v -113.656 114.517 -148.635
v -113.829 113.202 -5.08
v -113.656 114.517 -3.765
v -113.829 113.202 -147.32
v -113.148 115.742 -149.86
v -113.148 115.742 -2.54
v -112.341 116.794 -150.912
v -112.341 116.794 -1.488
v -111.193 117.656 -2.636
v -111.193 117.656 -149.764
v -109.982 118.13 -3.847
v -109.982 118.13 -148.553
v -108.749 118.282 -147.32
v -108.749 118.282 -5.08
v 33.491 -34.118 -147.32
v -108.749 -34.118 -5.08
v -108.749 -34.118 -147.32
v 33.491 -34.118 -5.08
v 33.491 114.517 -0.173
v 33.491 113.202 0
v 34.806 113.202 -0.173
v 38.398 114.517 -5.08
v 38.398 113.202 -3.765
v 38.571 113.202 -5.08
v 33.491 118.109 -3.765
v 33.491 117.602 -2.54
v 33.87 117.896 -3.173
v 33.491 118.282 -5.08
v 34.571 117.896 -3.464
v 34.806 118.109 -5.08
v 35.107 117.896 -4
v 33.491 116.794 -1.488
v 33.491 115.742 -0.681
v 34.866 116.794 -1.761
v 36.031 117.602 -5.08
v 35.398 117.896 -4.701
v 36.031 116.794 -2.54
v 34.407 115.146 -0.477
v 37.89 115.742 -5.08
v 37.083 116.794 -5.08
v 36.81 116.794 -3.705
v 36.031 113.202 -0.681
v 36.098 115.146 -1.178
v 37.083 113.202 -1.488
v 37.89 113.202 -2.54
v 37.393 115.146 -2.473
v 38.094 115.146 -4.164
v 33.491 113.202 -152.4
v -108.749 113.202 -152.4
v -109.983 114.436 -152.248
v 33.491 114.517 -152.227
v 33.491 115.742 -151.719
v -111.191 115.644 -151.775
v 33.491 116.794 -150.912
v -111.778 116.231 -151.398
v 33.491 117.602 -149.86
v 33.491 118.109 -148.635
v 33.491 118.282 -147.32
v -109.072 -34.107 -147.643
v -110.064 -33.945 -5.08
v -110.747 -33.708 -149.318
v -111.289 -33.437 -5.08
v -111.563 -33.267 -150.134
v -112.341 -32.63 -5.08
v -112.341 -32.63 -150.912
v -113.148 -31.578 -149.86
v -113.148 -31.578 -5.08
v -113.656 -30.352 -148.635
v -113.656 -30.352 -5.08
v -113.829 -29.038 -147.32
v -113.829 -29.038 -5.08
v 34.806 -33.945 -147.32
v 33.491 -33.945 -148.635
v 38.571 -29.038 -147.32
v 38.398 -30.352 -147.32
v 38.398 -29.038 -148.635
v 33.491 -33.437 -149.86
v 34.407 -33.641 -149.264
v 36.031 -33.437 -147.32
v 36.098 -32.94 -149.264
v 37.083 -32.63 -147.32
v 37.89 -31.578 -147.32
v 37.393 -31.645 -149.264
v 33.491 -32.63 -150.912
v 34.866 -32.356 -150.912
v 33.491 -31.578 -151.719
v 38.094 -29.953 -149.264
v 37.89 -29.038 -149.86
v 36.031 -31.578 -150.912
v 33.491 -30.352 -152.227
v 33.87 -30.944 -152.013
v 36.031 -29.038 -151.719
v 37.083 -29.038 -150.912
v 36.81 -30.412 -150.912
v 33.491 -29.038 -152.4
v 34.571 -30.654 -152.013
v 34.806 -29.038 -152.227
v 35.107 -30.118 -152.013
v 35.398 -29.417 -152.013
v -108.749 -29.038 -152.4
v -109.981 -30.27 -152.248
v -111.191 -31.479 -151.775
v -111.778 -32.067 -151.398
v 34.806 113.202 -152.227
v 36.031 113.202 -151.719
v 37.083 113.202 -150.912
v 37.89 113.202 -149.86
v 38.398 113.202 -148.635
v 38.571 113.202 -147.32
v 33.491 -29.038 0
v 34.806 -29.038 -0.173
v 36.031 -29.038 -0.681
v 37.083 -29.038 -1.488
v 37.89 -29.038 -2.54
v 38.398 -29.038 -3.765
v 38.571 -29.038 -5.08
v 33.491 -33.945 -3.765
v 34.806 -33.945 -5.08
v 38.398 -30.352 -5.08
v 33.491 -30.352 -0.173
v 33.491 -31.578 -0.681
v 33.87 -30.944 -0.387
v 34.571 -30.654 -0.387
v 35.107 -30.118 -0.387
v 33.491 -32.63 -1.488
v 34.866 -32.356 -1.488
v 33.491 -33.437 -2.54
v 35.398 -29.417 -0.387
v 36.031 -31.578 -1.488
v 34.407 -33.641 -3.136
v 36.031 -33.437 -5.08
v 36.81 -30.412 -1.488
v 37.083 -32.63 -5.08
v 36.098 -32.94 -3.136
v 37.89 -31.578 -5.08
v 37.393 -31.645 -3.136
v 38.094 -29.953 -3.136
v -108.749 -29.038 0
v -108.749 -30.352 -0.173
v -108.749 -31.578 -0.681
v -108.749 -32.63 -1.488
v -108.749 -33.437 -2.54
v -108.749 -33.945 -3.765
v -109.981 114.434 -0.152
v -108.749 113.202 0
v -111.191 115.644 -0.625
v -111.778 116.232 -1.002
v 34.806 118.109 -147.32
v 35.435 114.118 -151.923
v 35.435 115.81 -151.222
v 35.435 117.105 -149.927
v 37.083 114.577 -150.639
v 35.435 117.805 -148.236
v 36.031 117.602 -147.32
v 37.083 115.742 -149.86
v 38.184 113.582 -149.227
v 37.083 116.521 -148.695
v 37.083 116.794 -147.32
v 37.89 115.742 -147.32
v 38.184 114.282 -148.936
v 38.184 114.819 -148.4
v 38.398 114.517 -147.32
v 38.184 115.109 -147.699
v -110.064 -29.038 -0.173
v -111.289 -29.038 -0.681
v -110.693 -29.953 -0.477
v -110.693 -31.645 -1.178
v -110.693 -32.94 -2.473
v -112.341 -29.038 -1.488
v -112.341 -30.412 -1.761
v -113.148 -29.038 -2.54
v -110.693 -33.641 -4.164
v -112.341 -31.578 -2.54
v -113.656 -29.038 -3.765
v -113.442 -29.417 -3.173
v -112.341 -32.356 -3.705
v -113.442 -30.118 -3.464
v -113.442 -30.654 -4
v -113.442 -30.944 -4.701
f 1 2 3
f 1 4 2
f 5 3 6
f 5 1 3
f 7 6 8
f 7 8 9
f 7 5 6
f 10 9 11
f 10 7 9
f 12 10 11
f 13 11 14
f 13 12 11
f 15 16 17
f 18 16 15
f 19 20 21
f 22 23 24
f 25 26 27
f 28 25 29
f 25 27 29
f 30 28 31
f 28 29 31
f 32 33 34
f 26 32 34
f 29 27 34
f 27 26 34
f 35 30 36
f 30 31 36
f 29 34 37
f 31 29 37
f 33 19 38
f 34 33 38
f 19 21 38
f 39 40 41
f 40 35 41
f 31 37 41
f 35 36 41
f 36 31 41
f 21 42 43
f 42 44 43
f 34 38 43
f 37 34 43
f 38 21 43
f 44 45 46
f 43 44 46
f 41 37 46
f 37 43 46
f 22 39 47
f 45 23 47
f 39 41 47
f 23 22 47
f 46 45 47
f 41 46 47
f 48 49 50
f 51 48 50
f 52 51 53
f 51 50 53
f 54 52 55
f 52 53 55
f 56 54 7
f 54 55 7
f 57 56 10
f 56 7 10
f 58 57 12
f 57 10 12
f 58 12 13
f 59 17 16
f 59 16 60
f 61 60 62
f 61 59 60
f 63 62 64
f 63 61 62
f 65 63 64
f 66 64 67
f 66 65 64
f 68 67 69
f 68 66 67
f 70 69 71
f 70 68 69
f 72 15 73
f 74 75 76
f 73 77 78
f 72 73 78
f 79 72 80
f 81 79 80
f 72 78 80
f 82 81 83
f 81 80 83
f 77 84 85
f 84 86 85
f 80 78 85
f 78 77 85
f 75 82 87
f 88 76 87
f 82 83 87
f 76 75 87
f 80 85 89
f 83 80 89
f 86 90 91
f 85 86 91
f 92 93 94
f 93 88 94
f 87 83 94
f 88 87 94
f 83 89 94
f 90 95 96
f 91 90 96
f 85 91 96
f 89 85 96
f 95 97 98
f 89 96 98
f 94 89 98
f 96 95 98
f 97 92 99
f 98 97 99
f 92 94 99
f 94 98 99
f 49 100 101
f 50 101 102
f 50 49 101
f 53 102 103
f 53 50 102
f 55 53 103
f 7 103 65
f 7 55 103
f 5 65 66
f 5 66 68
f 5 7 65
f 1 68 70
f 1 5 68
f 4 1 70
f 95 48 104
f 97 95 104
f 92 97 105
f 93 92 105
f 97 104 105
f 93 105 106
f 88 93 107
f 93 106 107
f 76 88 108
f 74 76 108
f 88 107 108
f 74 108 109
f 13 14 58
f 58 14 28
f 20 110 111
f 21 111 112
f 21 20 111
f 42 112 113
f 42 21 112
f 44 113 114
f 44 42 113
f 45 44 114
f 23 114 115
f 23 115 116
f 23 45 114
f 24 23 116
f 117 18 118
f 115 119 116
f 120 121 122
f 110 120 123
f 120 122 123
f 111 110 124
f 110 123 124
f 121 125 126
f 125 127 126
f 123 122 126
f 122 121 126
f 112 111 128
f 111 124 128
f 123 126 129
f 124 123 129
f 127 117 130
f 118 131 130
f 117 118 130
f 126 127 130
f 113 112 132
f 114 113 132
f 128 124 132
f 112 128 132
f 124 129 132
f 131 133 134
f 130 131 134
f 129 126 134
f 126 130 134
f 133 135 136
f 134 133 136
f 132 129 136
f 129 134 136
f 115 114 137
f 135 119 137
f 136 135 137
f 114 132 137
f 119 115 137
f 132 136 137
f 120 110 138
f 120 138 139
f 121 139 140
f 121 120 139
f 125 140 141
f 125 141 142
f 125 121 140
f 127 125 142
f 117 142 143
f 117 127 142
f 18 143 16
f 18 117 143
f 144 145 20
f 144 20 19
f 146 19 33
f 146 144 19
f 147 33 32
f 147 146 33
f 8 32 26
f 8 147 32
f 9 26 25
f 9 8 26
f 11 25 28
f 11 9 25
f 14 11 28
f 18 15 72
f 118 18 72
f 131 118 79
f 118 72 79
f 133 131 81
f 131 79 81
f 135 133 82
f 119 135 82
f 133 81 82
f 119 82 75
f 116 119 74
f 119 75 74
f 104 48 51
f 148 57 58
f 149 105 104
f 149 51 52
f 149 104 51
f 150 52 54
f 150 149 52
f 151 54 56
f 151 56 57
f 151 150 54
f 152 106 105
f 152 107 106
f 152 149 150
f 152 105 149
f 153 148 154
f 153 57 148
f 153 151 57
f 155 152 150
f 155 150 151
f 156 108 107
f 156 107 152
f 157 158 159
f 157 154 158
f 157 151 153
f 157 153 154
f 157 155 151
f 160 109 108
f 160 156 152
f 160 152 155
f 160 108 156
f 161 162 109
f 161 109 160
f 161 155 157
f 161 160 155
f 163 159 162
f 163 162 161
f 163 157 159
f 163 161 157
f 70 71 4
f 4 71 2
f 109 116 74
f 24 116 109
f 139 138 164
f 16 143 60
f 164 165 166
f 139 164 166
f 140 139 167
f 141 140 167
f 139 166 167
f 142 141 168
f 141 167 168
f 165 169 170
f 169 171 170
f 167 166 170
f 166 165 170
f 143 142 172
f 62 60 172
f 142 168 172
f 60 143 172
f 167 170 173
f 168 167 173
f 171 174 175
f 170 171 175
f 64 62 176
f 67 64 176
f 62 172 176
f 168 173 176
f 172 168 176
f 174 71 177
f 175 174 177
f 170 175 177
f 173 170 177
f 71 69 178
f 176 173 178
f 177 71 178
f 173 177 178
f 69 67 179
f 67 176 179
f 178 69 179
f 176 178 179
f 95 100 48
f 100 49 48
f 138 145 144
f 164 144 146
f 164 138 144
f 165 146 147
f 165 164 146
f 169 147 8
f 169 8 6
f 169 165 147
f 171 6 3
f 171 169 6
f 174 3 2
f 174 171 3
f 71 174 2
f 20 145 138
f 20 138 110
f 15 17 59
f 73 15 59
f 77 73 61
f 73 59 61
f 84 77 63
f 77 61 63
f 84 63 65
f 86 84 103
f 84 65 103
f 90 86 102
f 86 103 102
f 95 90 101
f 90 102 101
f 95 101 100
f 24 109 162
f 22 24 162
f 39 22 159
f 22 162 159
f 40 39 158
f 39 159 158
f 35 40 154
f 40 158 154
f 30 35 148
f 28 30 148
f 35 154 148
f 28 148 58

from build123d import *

# Parameters (mm, degrees)
F0_W         = 152.4
F0_H         = 152.4
F1_DEPTH     = 152.4
F2_R         = 5.08
F3_R         = 5.08
F4_R         = 5.08
F6_T1_DEPTH  = 154.94
F6_T3_DEPTH  = 142.24
F6_T5_DEPTH  = 142.24
F6_S9_W      = 5.1816
F6_S9_H      = 5.1816
F6_T10_DEPTH = 5.1816
F6_T14_ANGLE = 90
F6_T16_ANGLE = 90


# Not quite as in the source:
# - a fillet or chamfer that OpenCascade refuses, or shapes differently, is made with other operations: its cross-section is extruded or revolved along the edge and cut away or added
# - a feature of the source that left no trace in its solid (it failed there, or was rolled back) is left out


with BuildPart() as f1:
    # F0 (on Top) → F1 (new body)
    with BuildSketch(Plane.XY):
        with Locations((-37.6290231943, 42.0823047486)):
            Rectangle(F0_W, F0_H)
    extrude(amount=-F1_DEPTH)

    # F2
    f2_edges = [f1.edges().sort_by_distance(p)[0] for p in [
        (38.570977, -34.117695, -76.2),
    ]]
    fillet(f2_edges, radius=F2_R)

    # F3
    f3_edges = [f1.edges().sort_by_distance(p)[0] for p in [
        (38.570977, 44.622305, 0),
    ]]
    fillet(f3_edges, radius=F3_R)

    # F4
    f4_edges = [f1.edges().sort_by_distance(p)[0] for p in [
        (-113.829023, -34.117695, -78.74),
        (-113.829023, -32.629798, -1.487898),
        (-113.829023, 42.082305, -152.4),
        (-113.829023, 44.622305, 0),
        (-113.829023, 118.282305, -76.2),
    ]]
    fillet(f4_edges, radius=F4_R)

    # F6: fillet of radius 5.08 on 8 edges, made by hand

    # F6_s2 → F6_t1 (cut)
    with BuildSketch(Plane.YZ.offset(-121.4490231943)):
        with BuildLine():
            ThreePointArc((113.2023047486, -152.4), (116.794407197, -150.9121024484), (118.2823047486, -147.32))
            Line((118.2823047486, -147.32), (118.2823047486, -152.4))
            Line((118.2823047486, -152.4), (113.2023047486, -152.4))
        make_face()
        with BuildLine():
            ThreePointArc((113.2023047486, 0), (116.794407197, -1.4878975516), (118.2823047486, -5.08))
            Line((118.2823047486, -5.08), (118.2823047486, 0))
            Line((118.2823047486, 0), (113.2023047486, 0))
        make_face()
        with BuildLine():
            ThreePointArc((-34.1176952514, -147.32), (-32.6297976998, -150.9121024484), (-29.0376952514, -152.4))
            Line((-29.0376952514, -152.4), (-34.1176952514, -152.4))
            Line((-34.1176952514, -152.4), (-34.1176952514, -147.32))
        make_face()
    extrude(amount=F6_T1_DEPTH, mode=Mode.SUBTRACT)

    # F6_s4 → F6_t3 (cut)
    with BuildSketch(Plane.XY.offset(-147.32)):
        with BuildLine():
            ThreePointArc((38.5709768057, 113.2023047486), (37.0830792541, 116.794407197), (33.4909768057, 118.2823047486))
            Line((33.4909768057, 118.2823047486), (38.5709768057, 118.2823047486))
            Line((38.5709768057, 118.2823047486), (38.5709768057, 113.2023047486))
        make_face()
    extrude(amount=F6_T3_DEPTH, mode=Mode.SUBTRACT)

    # F6_s6 → F6_t5 (cut)
    with BuildSketch(Plane.XZ.offset(-113.2023047486)):
        with BuildLine():
            ThreePointArc((33.4909768057, -152.4), (37.0830792541, -150.9121024484), (38.5709768057, -147.32))
            Line((38.5709768057, -147.32), (38.5709768057, -152.4))
            Line((38.5709768057, -152.4), (33.4909768057, -152.4))
        make_face()
    extrude(amount=F6_T5_DEPTH, mode=Mode.SUBTRACT)


with BuildPart() as f6_tool8:
    # F6_s9 → F6_t10 (new body)
    with BuildSketch(Plane.YZ.offset(33.4909768057)):
        with Locations((115.7931047486, -149.9108)):
            Rectangle(F6_S9_W, F6_S9_H)
    extrude(amount=F6_T10_DEPTH)

    # F6_s11 → F6_t12 (revolve, cut)
    with BuildSketch(Plane(origin=(33.4909768057, 113.2023047486, -147.32), x_dir=(0, -0.7071067812, 0.7071067812), z_dir=(0, 0.7071067812, 0.7071067812))):
        with BuildLine():
            ThreePointArc((0, -5.08), (5.08, 0), (0, 5.08))
            Line((0, 5.08), (0, -5.08))
        make_face()
    revolve(axis=Axis((33.4909768057, 113.2023047486, -147.32), (1, 0, 0)), mode=Mode.SUBTRACT)


with BuildPart() as f1_1:
    add(f1.part)

    # F6_t7: cut F6_tool8
    add(f6_tool8.part, mode=Mode.SUBTRACT)

    # F6_s13 → F6_t14 (revolve, cut)
    with BuildSketch(Plane.YZ.offset(33.4909768057)):
        with BuildLine():
            ThreePointArc((118.2823047486, -5.08), (116.794407197, -1.4878975516), (113.2023047486, 0))
            Line((113.2023047486, 0), (118.2823047486, 0))
            Line((118.2823047486, 0), (118.2823047486, -5.08))
        make_face()
    revolve(axis=Axis((33.4909768057, 118.2823047486, -5.08), (0, 1, 0)), revolution_arc=F6_T14_ANGLE, mode=Mode.SUBTRACT)

    # F6_s15 → F6_t16 (revolve, cut)
    with BuildSketch(Plane.YZ.offset(33.4909768057)):
        with BuildLine():
            ThreePointArc((-34.1176952514, -147.32), (-32.6297976998, -150.9121024484), (-29.0376952514, -152.4))
            Line((-29.0376952514, -152.4), (-34.1176952514, -152.4))
            Line((-34.1176952514, -152.4), (-34.1176952514, -147.32))
        make_face()
    revolve(axis=Axis((33.4909768057, -29.0376952514, -152.4), (0, 0, 1)), revolution_arc=F6_T16_ANGLE, mode=Mode.SUBTRACT)


solid = f1_1.part
